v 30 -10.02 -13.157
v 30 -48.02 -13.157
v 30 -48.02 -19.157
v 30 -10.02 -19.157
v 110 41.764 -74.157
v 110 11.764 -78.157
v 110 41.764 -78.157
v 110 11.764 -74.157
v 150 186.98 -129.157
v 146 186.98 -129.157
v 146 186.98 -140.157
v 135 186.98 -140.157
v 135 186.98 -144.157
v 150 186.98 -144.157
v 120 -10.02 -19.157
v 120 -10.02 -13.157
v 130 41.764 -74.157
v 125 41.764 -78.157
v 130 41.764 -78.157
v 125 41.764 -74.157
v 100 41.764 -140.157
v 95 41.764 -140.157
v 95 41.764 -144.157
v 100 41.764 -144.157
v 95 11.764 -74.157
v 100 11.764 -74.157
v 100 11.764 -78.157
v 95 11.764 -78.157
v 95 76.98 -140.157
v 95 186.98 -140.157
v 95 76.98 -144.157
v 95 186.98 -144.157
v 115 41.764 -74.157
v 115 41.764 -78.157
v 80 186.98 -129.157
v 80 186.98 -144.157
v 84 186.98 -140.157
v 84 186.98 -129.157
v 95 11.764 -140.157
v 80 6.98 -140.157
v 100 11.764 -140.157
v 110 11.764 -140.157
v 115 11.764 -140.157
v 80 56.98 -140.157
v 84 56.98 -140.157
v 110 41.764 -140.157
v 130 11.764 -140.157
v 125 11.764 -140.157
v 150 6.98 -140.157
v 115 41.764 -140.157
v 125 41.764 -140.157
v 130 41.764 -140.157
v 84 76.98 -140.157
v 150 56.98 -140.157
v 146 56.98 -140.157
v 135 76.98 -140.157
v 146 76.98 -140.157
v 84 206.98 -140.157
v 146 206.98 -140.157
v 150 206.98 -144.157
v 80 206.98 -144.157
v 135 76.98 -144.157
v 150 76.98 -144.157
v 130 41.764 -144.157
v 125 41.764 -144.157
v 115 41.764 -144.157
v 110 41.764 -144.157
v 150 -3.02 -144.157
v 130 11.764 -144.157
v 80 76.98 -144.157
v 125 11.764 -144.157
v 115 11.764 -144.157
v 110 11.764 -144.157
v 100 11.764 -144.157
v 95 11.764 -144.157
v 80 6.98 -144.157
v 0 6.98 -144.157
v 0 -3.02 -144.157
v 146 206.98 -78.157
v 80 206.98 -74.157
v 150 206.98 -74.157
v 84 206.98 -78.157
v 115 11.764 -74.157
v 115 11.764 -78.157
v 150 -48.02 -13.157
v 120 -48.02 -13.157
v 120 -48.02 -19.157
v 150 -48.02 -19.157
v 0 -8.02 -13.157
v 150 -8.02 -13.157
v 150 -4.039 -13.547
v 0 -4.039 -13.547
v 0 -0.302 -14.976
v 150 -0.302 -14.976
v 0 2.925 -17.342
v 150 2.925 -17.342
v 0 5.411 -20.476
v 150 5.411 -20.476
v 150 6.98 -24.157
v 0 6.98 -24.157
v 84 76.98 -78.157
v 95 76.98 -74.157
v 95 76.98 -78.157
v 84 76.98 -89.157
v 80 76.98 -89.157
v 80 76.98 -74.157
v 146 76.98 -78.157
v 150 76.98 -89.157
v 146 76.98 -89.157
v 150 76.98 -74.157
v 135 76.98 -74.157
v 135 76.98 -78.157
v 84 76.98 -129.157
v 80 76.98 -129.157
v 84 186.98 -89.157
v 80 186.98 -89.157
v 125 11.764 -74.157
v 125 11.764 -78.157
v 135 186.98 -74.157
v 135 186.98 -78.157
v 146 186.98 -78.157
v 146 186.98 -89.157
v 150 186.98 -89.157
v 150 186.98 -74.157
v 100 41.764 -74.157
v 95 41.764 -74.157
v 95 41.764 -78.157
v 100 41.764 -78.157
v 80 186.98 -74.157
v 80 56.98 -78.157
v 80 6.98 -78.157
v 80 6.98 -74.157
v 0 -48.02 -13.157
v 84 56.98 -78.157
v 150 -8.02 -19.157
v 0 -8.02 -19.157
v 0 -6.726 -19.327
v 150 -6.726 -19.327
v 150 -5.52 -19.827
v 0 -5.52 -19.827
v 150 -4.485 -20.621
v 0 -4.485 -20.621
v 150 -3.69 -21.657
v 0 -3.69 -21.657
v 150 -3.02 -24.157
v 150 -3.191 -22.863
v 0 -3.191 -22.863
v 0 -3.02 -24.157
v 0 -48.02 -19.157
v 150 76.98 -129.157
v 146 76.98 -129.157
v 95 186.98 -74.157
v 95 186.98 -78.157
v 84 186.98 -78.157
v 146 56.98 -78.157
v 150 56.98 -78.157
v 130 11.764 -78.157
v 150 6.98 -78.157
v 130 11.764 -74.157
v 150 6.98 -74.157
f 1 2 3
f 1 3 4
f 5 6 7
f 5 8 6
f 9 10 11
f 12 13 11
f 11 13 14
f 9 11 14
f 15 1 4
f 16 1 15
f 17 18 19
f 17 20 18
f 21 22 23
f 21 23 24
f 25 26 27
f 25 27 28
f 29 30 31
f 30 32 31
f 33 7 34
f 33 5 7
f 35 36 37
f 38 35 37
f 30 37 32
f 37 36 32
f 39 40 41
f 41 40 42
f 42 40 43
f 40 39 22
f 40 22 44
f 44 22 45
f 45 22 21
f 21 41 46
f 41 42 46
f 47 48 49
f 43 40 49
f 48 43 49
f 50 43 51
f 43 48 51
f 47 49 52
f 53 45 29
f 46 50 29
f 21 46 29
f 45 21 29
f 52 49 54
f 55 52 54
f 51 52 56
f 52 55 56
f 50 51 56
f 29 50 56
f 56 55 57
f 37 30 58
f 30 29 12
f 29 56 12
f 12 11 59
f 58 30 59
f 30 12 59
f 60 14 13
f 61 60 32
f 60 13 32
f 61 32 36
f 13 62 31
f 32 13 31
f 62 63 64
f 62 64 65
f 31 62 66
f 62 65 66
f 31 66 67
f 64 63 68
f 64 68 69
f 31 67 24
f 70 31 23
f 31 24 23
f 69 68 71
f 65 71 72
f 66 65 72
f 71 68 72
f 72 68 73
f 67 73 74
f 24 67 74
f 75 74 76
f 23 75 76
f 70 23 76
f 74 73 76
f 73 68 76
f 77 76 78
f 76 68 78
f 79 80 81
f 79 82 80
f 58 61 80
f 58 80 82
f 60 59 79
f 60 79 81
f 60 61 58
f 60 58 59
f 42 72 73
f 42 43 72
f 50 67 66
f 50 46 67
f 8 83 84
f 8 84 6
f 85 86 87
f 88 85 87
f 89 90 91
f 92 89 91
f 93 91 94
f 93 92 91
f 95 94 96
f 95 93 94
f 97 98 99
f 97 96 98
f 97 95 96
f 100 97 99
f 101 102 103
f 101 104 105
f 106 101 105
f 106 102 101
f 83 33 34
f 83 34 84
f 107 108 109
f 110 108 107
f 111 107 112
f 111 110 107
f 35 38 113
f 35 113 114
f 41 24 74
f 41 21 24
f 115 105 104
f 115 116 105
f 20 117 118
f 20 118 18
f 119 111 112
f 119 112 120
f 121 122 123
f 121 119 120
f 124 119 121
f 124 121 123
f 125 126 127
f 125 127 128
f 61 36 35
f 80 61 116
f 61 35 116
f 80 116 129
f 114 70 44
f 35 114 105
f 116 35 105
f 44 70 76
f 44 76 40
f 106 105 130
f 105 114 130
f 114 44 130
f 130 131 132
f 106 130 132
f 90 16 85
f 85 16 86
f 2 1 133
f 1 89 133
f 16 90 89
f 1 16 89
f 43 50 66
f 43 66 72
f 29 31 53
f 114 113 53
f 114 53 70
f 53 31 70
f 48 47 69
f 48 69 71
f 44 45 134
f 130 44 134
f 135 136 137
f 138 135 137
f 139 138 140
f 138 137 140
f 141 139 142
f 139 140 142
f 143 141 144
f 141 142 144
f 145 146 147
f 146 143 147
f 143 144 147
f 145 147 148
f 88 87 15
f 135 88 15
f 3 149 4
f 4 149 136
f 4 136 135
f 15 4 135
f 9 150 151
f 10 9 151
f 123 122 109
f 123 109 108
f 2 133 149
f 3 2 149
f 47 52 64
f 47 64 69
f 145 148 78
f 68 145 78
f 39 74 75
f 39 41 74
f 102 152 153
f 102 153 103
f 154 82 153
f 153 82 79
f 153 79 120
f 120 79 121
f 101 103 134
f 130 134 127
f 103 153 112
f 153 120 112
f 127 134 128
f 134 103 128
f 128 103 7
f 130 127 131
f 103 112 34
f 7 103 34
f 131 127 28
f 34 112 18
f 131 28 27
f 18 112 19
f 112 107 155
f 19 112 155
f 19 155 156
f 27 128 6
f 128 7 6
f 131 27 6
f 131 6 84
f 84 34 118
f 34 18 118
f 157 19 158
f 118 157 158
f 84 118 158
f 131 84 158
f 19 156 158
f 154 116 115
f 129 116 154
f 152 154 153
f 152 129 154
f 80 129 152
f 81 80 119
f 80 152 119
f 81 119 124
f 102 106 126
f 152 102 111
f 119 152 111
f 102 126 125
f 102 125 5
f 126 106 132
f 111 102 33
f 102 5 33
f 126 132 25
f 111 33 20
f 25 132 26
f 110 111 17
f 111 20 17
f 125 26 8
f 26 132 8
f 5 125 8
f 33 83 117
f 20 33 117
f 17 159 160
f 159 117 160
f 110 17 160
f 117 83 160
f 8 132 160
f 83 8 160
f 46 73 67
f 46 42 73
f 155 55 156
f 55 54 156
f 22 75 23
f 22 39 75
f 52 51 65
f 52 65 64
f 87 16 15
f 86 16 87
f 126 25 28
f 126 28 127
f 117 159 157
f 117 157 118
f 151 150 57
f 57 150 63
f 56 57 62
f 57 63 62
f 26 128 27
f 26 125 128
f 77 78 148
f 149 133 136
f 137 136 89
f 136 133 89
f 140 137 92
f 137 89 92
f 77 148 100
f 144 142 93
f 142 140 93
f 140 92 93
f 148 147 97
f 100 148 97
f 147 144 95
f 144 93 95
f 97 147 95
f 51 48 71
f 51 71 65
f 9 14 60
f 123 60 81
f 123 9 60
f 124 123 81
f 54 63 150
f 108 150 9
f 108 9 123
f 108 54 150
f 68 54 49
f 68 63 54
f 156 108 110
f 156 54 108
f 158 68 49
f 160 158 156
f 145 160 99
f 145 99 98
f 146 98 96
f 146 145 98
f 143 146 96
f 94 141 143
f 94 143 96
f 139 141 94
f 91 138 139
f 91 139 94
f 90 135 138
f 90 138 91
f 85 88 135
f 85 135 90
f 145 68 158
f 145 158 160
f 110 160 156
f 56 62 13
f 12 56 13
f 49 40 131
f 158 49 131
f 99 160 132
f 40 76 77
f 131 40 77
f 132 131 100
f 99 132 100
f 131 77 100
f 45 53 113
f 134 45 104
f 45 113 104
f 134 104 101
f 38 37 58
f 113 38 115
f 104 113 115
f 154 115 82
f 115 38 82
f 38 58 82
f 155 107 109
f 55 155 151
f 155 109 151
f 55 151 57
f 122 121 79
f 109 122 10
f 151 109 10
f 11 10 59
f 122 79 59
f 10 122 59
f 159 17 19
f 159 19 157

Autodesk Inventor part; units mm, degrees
ref_plane "YZ Plane" through (0, 0, 0) normal (1, 0, 0) x (0, 1, 0)
ref_plane "XZ Plane" through (0, 0, 0) normal (0, 1, 0) x (-1, 0, 0)
ref_plane "XY Plane" through (0, 0, 0) normal (0, 0, 1) x (1, 0, 0)
sketch "Sketch1" plane through (0, 0, 0) normal (1, 0, 0) x (0, 1, 0)
  line L0 (-8.0203, -13.1567) -> (-48.0203, -13.1567)
  line L1 (-48.0203, -13.1567) -> (-48.0203, -19.1567)
  line L2 (-48.0203, -19.1567) -> (-8.0203, -19.1567)
  line L3 (-3.0203, -24.1567) -> (-3.0203, -144.1567)
  line L4 (-3.0203, -144.1567) -> (6.9797, -144.1567)
  line L5 (6.9797, -144.1567) -> (6.9797, -24.1567)
  arc A0 (6.9797, -24.1567) -> (-8.0203, -13.1567) centre (-7.4798, -28.147) ccw
  arc A1 (-3.0203, -24.1567) -> (-8.0203, -19.1567) centre (-8.0203, -24.1567) ccw
  point P0 (0, 0)
  dimension "d2" = 40
  dimension "d5" = 6
  dimension "d15" = 120
  dimension "d16" = 10
  dimension "d19" = 15
  dimension "d20" = 5
extrude "Extrusion1" add sketch "Sketch1" along normal blind 150
sketch "Sketch2" plane through (0, -48.0203, -13.1567) normal (0, 0, 1) x (1, 0, 0)
  line L0 (30, 38) -> (120, 38)
  line L1 (120, 38) -> (120, -15.5969)
  line L2 (120, -15.5969) -> (30, -15.5969)
  line L3 (30, -15.5969) -> (30, 38)
  line L4 (0, 40) -> (150, 40) projected
  line L5 (0, 40) -> (0, 0) projected
  point P0 (0, 48.0203)
  dimension "d10" = 2
  dimension "d11" = 30
  dimension "d12" = 90
extrude "Extrusion2" cut sketch "Sketch2" against normal blind 150
sketch "Sketch3" plane through (150, 0, 0) normal (1, 0, 0) x (0, 0, -1)
  line L0 (144.1567, 6.9797) -> (24.1567, 6.9797) projected
  point P0 (0, 0)
sketch "Sketch4" plane through (0, 6.9797, -24.1567) normal (0, 1, 0) x (1, 0, 0)
  line L0 (150, 120) -> (150, 0) projected
  line L1 (150, 120) -> (80, 120)
  line L2 (80, 120) -> (80, 50)
  line L3 (80, 50) -> (150, 50)
  line L4 (150, 50) -> (150, 120)
  point P0 (0, -24.1567)
  dimension "d31" = 70
  dimension "d32" = 70
extrude "Extrusion3" add sketch "Sketch4" along normal blind 200
sketch "Sketch5" plane through (0, 206.9797, -24.1567) normal (0, 1, 0) x (1, 0, 0)
  line L0 (84, 54) -> (146, 54)
  line L1 (146, 54) -> (146, 116)
  line L2 (146, 116) -> (84, 116)
  line L3 (84, 116) -> (84, 54)
  line L4 (150, 120) -> (80, 120) projected
  line L5 (150, 50) -> (150, 120) projected
  point P0 (0, -24.1567)
  dimension "d35" = 62
  dimension "d36" = 62
  dimension "d37" = 4
  dimension "d38" = 4
extrude "Extrusion4" cut sketch "Sketch5" against normal blind 150
sketch "Sketch6" plane through (150, 0, 0) normal (1, 0, 0) x (0, 0, -1)
  line L0 (78.1567, 6.9797) -> (140.1567, 6.9797)
  line L1 (140.1567, 6.9797) -> (140.1567, 56.9797)
  line L2 (140.1567, 56.9797) -> (78.1567, 56.9797)
  line L3 (78.1567, 56.9797) -> (78.1567, 6.9797)
  line L4 (144.1567, -3.0203) -> (144.1567, 206.9797) projected
  line L5 (74.1567, 6.9797) -> (144.1567, 6.9797) projected
  point P0 (0, 0)
  dimension "d41" = 50
  dimension "d42" = 62
  dimension "d43" = 4
  dimension "d47" = 0
extrude "Extrusion5" cut sketch "Sketch6" against normal blind 150
sketch "Sketch8" plane through (80, 6.9797, -74.1567) normal (0, 0, 1) x (1, 0, 0)
  line L0 (15, 34.7846) -> (20, 34.7846)
  line L1 (20, 34.7846) -> (20, 4.7846)
  line L2 (20, 4.7846) -> (15, 4.7846)
  line L3 (15, 4.7846) -> (15, 34.7846)
  line L4 (30, 34.7846) -> (35, 34.7846)
  line L5 (35, 34.7846) -> (35, 4.7846)
  line L6 (35, 4.7846) -> (30, 4.7846)
  line L7 (30, 4.7846) -> (30, 34.7846)
  line L8 (45, 34.7846) -> (50, 34.7846)
  line L9 (50, 34.7846) -> (50, 4.7846)
  line L10 (50, 4.7846) -> (45, 4.7846)
  line L11 (45, 4.7846) -> (45, 34.7846)
  line L12 (0, 0) -> (0, 200) projected
  point P0 (-80, -6.9797)
  dimension "d48" = 5
  dimension "d49" = 30
  dimension "d50" = 5
  dimension "d51" = 30
  dimension "d52" = 5
  dimension "d53" = 30
  dimension "d54" = 0
  dimension "d55" = 0
  dimension "d56" = 10
  dimension "d57" = 10
  dimension "d58" = 15
extrude "Extrusion6" cut sketch "Sketch8" against normal through all
sketch "Sketch9" plane through (80, 6.9797, -74.1567) normal (0, 0, 1) x (1, 0, 0)
  line L0 (0, 180) -> (15, 180)
  line L1 (15, 180) -> (15, 70)
  line L2 (15, 70) -> (0, 70)
  line L3 (0, 70) -> (0, 180)
  line L4 (0, 0) -> (0, 200) projected
  line L5 (55, 180) -> (70, 180)
  line L6 (70, 180) -> (70, 70)
  line L7 (70, 70) -> (55, 70)
  line L8 (55, 70) -> (55, 180)
  line L9 (70, 0) -> (70, 200) projected
  line L10 (0, 200) -> (70, 200) projected
  point P0 (-80, -6.9797)
  dimension "d61" = 0
  dimension "d62" = 15
  dimension "d63" = 110
  dimension "d64" = 15
  dimension "d65" = 110
  dimension "d66" = 0
  dimension "d67" = 0
  dimension "d80" = 20
extrude "Extrusion7" cut sketch "Sketch9" against normal blind 15
sketch "Sketch11" plane through (0, -3.0203, -144.1567) normal (0, 0, -1) x (-1, 0, 0)
  line L0 (-80, 10) -> (-80, 210) projected
  line L1 (-80, 190) -> (-95, 190)
  line L2 (-95, 190) -> (-95, 80)
  line L3 (-95, 80) -> (-80, 80)
  line L4 (-80, 80) -> (-80, 190)
  line L5 (-135, 190) -> (-150, 190)
  line L6 (-150, 190) -> (-150, 80)
  line L7 (-150, 80) -> (-135, 80)
  line L8 (-135, 80) -> (-135, 190)
  line L9 (-150, 0) -> (-150, 210) projected
  point P0 (0, 3.0203)
  point P1 (-80, 190)
  point P2 (-110.828, 190)
  point P3 (-80, 80)
  dimension "d71" = 110
  dimension "d72" = 0
  dimension "d73" = 15
  dimension "d74" = 110
  dimension "d75" = 0
  dimension "d76" = 15
  dimension "d77" = 0
  dimension "d81" = 0
extrude "Extrusion8" cut sketch "Sketch11" against normal blind 15
properties part number "Housing"
